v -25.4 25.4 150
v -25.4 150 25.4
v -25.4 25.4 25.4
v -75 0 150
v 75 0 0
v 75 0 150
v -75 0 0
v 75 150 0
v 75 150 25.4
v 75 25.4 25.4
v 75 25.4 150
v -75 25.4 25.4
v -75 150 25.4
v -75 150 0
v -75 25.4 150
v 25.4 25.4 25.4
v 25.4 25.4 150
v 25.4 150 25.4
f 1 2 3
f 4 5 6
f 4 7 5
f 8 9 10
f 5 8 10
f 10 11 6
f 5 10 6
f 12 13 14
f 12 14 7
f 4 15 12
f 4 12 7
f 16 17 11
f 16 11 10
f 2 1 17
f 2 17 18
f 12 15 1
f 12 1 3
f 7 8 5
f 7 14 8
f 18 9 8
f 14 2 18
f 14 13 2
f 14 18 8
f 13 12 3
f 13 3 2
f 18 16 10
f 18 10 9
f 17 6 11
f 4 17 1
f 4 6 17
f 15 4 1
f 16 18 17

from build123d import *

# Parameters (mm, degrees)
BOSS_EXTRUDE1_DEPTH      = 75
BOSS_EXTRUDE1_DEPTH_BACK = 75
BOSS_EXTRUDE2_DEPTH      = 25.4
BOSS_EXTRUDE2_DEPTH_BACK = 25.4


with BuildPart() as part:
    # Sketch1 → Boss-Extrude1 (new, two sides: drawn at the far end of the back side and taken through both)
    with BuildSketch(Plane.YZ.offset(-BOSS_EXTRUDE1_DEPTH_BACK)):
        Polygon((0, 0), (0, 150), (25.4, 150), (25.4, 25.4), (150, 25.4), (150, 0), align=None)
    extrude(amount=BOSS_EXTRUDE1_DEPTH + BOSS_EXTRUDE1_DEPTH_BACK)

    # Sketch3 → Boss-Extrude2 (add, two sides: drawn at the far end of the back side and taken through both)
    with BuildSketch(Plane.YZ.offset(-BOSS_EXTRUDE2_DEPTH_BACK)):
        Polygon((0, 150), (25.4, 150), (150, 25.4), (150, 0), (0, 0), align=None)
    extrude(amount=BOSS_EXTRUDE2_DEPTH + BOSS_EXTRUDE2_DEPTH_BACK)


solid = part.part
